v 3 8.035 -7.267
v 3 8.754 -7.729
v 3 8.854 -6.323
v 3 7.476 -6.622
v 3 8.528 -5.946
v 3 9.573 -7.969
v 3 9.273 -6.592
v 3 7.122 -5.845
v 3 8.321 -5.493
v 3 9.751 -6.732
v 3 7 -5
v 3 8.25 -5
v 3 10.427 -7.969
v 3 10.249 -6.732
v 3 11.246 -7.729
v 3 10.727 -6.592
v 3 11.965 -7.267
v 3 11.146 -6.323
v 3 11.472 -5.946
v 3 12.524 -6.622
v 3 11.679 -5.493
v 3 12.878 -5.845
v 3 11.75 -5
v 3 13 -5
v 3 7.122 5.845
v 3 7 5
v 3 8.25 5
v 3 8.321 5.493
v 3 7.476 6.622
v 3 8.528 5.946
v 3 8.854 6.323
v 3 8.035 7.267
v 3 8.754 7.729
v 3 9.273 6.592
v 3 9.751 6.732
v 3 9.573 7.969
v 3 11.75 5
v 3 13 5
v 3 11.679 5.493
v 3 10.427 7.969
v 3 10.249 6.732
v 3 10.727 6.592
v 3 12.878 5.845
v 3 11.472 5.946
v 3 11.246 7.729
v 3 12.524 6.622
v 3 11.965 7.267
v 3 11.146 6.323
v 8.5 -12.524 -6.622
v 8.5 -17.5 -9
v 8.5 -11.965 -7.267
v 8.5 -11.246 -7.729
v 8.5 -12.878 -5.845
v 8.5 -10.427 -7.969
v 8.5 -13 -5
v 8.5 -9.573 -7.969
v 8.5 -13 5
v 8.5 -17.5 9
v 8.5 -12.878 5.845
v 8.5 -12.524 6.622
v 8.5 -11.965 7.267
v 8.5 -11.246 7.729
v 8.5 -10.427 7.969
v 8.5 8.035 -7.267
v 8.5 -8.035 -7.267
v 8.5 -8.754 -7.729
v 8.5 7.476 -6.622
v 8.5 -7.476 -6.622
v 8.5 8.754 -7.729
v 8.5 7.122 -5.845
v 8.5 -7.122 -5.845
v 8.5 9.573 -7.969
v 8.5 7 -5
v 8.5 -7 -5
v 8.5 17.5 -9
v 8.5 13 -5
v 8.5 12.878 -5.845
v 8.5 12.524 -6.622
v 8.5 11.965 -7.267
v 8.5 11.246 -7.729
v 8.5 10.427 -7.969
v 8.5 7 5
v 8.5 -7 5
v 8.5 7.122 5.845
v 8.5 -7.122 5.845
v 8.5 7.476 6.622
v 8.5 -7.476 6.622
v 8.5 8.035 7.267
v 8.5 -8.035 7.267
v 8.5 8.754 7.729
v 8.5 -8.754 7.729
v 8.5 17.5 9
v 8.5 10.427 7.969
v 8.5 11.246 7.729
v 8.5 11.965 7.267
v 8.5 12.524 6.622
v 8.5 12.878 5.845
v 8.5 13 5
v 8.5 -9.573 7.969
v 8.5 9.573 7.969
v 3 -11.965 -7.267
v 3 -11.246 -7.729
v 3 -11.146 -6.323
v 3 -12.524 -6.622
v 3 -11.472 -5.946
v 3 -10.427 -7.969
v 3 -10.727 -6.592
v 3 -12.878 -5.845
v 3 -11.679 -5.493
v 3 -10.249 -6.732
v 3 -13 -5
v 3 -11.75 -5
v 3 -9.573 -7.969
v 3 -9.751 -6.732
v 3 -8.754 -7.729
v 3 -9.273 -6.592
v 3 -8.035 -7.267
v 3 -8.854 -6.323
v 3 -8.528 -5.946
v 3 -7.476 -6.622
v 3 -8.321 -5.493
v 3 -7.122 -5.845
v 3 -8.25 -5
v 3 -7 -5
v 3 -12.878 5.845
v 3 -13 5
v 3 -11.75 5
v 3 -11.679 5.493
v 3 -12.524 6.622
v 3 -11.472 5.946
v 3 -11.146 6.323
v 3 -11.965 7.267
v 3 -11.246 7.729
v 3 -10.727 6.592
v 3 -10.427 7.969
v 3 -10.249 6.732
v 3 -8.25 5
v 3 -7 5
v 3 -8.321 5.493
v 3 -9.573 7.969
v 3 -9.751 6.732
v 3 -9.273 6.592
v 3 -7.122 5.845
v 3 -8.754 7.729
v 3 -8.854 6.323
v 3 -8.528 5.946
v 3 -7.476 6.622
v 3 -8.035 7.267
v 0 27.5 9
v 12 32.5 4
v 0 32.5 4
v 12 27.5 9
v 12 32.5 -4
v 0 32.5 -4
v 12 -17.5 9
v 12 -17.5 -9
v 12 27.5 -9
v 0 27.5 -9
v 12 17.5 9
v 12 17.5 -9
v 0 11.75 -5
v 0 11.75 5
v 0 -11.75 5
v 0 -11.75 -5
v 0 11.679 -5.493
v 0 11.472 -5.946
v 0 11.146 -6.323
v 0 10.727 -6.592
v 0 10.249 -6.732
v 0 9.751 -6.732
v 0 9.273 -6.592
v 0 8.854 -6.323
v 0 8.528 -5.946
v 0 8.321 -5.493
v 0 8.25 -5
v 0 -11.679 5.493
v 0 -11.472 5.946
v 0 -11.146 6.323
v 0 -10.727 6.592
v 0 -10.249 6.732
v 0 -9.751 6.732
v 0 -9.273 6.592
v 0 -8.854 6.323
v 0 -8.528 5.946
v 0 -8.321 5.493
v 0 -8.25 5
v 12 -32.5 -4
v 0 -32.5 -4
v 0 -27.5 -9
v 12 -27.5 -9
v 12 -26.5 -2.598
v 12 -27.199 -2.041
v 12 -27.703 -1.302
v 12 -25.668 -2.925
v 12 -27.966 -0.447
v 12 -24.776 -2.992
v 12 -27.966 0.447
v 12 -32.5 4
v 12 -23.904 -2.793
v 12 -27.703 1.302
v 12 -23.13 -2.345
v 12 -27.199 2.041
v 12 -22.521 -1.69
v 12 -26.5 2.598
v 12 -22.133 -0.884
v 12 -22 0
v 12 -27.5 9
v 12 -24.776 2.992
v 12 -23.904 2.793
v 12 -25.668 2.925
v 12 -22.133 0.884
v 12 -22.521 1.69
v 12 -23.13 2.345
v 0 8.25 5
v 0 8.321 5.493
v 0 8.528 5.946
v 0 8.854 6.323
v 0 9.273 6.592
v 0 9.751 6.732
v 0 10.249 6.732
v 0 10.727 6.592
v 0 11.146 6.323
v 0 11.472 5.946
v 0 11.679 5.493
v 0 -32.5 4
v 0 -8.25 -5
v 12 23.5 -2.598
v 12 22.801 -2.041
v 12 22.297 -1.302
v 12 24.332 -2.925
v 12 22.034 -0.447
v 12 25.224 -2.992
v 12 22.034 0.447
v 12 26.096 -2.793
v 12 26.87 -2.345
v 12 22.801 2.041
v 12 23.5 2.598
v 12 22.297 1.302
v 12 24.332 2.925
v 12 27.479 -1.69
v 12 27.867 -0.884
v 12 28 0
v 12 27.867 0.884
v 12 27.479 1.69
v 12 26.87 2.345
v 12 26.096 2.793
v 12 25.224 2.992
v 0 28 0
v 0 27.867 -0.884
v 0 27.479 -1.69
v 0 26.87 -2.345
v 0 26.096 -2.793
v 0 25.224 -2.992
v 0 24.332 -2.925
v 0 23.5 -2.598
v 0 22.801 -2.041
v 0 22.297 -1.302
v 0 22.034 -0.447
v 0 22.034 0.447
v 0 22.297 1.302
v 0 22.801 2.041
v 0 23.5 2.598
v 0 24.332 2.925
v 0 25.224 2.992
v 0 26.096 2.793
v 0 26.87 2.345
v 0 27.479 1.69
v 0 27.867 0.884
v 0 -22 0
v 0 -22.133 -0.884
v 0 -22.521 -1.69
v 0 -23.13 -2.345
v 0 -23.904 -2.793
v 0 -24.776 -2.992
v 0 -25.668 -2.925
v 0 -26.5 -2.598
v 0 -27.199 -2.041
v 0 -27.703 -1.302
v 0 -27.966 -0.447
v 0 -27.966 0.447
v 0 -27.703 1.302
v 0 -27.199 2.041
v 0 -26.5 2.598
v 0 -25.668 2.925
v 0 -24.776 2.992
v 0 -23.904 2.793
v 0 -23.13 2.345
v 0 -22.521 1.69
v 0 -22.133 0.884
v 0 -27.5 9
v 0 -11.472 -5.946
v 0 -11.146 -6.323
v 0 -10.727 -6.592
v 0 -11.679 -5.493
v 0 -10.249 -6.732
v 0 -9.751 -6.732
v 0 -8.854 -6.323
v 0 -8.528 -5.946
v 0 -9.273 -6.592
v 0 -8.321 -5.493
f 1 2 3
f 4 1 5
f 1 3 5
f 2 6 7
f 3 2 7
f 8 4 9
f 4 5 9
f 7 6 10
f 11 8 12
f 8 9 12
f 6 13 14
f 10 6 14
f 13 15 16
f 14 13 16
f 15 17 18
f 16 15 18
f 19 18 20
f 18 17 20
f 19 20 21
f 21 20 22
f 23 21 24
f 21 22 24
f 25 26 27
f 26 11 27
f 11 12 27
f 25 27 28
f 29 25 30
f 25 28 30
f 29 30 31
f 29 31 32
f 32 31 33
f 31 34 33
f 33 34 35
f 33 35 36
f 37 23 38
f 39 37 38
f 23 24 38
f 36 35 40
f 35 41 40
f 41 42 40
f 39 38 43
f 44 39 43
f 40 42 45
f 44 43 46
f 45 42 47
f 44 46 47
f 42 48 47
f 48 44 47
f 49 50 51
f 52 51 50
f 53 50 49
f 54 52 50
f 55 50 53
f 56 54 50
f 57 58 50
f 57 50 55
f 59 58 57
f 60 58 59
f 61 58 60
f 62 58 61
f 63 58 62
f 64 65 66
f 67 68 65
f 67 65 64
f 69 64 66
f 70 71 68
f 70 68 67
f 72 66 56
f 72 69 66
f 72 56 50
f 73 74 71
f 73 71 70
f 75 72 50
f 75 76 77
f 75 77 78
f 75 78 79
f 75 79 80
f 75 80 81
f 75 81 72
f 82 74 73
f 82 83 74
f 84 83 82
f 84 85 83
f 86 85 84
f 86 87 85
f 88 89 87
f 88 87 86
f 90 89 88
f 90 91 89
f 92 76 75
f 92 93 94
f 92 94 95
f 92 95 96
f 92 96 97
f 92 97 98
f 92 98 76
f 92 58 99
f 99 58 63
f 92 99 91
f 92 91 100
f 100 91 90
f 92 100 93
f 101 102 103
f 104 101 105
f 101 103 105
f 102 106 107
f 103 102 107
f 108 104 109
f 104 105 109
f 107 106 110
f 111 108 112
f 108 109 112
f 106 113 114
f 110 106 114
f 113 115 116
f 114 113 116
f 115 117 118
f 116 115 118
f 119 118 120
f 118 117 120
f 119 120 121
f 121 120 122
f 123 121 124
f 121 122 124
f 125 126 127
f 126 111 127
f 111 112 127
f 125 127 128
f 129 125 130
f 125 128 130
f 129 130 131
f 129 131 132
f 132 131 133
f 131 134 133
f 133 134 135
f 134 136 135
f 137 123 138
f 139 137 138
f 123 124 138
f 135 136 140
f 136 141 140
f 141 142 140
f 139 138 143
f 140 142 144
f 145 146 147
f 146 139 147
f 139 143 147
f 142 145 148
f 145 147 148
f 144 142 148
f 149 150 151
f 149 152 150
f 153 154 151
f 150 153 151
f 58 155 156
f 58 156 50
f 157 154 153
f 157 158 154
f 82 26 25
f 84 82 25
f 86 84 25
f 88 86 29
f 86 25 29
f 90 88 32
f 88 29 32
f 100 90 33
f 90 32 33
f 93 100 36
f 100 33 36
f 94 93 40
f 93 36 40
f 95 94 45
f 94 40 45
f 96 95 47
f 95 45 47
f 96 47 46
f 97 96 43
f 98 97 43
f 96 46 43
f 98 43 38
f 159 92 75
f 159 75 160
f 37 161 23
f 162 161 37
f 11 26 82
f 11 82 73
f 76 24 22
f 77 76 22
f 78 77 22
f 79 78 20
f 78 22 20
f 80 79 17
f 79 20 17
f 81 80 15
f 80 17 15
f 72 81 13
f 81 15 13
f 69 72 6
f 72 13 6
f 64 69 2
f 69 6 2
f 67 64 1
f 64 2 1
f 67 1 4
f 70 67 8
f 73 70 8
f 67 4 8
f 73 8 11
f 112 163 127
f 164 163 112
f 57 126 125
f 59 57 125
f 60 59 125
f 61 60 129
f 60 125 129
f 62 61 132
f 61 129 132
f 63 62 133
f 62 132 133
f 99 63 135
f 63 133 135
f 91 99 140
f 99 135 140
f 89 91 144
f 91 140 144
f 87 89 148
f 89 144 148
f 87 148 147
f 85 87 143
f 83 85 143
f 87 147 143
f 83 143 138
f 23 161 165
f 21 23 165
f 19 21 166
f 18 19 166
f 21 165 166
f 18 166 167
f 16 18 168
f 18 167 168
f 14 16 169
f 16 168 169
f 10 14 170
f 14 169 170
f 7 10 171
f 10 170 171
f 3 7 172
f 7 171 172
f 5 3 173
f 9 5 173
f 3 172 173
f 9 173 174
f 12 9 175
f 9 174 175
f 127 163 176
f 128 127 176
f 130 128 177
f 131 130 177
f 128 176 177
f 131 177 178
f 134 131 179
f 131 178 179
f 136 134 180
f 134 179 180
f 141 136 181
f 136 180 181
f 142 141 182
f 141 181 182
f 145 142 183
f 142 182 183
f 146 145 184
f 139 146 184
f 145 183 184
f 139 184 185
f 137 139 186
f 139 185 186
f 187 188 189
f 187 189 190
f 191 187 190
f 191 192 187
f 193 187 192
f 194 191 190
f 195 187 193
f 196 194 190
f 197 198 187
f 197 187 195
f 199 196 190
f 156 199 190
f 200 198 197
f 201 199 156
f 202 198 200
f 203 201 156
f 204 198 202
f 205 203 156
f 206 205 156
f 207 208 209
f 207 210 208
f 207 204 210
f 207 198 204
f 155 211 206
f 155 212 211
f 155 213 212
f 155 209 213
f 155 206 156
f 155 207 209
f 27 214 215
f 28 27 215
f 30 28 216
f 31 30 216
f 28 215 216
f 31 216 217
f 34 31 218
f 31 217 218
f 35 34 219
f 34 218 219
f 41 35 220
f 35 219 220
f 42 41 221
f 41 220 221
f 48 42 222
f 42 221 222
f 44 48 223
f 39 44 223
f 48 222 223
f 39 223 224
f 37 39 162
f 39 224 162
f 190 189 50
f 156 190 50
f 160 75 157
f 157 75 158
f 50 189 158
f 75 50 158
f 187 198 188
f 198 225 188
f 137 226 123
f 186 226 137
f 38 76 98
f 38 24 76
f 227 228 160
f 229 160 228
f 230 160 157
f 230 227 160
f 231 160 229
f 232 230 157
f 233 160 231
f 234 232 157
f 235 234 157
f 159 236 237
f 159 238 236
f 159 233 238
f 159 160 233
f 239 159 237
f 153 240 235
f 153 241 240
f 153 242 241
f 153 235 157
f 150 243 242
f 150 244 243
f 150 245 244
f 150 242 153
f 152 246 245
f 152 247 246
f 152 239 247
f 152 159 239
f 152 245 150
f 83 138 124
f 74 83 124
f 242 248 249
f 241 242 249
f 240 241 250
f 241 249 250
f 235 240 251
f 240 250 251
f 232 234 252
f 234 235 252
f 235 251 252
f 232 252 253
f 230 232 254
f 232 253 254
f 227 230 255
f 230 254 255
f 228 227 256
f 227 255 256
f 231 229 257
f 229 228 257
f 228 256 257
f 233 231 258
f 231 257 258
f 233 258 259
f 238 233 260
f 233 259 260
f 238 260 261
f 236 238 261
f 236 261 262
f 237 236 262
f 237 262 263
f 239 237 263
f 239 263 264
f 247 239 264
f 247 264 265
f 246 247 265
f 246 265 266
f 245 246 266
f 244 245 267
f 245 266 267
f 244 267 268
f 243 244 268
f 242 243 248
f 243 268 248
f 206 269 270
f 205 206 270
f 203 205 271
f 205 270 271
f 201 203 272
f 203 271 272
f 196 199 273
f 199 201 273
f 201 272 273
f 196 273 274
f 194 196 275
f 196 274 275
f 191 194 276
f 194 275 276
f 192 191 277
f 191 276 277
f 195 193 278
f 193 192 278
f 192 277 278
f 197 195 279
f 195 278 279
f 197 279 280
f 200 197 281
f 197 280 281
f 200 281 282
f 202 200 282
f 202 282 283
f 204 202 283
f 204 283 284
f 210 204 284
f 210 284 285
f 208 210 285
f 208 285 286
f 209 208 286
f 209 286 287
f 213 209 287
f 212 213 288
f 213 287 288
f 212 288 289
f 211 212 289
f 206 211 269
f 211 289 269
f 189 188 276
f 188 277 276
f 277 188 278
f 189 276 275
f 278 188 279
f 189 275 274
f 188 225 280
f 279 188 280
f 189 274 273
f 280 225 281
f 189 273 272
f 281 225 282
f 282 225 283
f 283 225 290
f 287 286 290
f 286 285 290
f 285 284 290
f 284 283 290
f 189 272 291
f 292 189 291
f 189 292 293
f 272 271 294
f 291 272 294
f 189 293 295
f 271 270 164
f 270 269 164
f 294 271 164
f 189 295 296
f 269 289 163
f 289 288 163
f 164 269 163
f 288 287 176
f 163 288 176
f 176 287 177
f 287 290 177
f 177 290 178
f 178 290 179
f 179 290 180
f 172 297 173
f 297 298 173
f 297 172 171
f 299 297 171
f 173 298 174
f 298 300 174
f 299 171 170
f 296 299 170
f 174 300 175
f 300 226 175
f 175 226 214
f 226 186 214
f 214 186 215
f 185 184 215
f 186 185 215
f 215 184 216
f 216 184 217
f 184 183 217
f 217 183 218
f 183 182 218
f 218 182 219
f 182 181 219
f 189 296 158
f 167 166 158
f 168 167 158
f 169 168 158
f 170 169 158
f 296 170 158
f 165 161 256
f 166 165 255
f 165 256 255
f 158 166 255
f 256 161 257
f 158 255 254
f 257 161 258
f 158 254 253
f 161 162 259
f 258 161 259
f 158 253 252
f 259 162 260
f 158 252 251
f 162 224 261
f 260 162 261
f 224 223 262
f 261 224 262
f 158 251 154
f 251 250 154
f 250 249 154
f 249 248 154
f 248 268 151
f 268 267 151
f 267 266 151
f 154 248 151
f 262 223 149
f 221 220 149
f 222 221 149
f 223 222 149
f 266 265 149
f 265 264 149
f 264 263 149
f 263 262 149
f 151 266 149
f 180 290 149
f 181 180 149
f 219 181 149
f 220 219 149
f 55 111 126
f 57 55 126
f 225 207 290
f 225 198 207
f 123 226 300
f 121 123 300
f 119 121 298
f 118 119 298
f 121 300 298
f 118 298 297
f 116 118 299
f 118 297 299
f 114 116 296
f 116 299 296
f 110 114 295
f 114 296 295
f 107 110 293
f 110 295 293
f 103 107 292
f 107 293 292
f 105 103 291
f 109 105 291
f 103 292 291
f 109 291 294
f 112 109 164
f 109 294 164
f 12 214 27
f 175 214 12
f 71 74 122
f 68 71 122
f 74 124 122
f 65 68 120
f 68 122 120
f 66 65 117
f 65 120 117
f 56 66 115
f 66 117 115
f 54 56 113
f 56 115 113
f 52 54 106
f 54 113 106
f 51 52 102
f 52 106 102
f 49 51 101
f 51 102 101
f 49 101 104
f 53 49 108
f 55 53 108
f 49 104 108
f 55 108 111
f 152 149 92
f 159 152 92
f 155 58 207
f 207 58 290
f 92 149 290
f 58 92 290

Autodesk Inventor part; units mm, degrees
ref_plane "YZ Plane" through (0, 0, 0) normal (1, 0, 0) x (0, 1, 0)
ref_plane "XZ Plane" through (0, 0, 0) normal (0, 1, 0) x (-1, 0, 0)
ref_plane "XY Plane" through (0, 0, 0) normal (0, 0, 1) x (1, 0, 0)
sketch "Sketch1" plane through (0, 0, 0) normal (1, 0, 0) x (0, 1, 0)
  line L0 (32.5, 9) -> (-32.5, 9)
  line L1 (-32.5, 9) -> (-32.5, -9)
  line L2 (-32.5, -9) -> (32.5, -9)
  line L3 (32.5, -9) -> (32.5, 9)
  line L4 (32.5, 9) -> (-32.5, -9) construction
  line L5 (-32.5, 9) -> (32.5, -9) construction
  circle A0 centre (-25, 0) radius 3
  circle A1 centre (25, 0) radius 3
  line L6 (-10, -5) -> (-10, 5) construction
  line L7 (-13, -5) -> (-13, 5)
  line L8 (-7, 5) -> (-7, -5)
  arc A2 (-13, -5) -> (-7, -5) centre (-10, -5) ccw
  arc A3 (-7, 5) -> (-13, 5) centre (-10, 5) ccw
  line L9 (10, -5) -> (10, 5) construction
  line L10 (13, -5) -> (13, 5)
  line L11 (7, 5) -> (7, -5)
  arc A4 (7, -5) -> (13, -5) centre (10, -5) ccw
  arc A5 (13, 5) -> (7, 5) centre (10, 5) ccw
  point P0 (0, 0)
  point P1 (-10, 0)
  point P2 (10, 0)
  dimension "d0" = 25
  dimension "d1" = 50
  dimension "d2" = 65
  dimension "d3" = 6
  dimension "d4" = 10
  dimension "d5" = 20
  dimension "d6" = 10
  dimension "d7" = 3
  dimension "d8" = 18
extrude "Extrusion1" add sketch "Sketch1" along normal blind 12
sketch "Sketch2" plane through (0, 0, 0) normal (-1, 0, 0) x (0, 0, 1)
  line L0 (9, -32.5) -> (-9, -32.5) projected
  line L1 (9, 32.5) -> (9, -32.5) projected
  line L2 (-9, 32.5) -> (9, 32.5) projected
  line L3 (-9, -32.5) -> (-9, 32.5) projected
  circle A0 centre (0, -25) radius 3 projected
  circle A1 centre (0, 25) radius 3 projected
  arc A2 (-5, 13) -> (-5, 7) centre (-5, 10) ccw projected
  line L4 (5, 13) -> (-5, 13) projected
  arc A3 (5, 7) -> (5, 13) centre (5, 10) ccw projected
  line L5 (-5, 7) -> (5, 7) projected
  line L6 (5, -7) -> (-5, -7) projected
  arc A4 (5, -13) -> (5, -7) centre (5, -10) ccw projected
  line L7 (-5, -13) -> (5, -13) projected
  arc A5 (-5, -7) -> (-5, -13) centre (-5, -10) ccw projected
  line L8 (5, 10) -> (-5, 10) construction
  line L9 (5, 8.25) -> (-5, 8.25)
  line L10 (-5, 11.75) -> (5, 11.75)
  arc A6 (5, 8.25) -> (5, 11.75) centre (5, 10) ccw
  arc A7 (-5, 11.75) -> (-5, 8.25) centre (-5, 10) ccw
  line L11 (5, -10) -> (-5, -10) construction
  line L12 (5, -11.75) -> (-5, -11.75)
  line L13 (-5, -8.25) -> (5, -8.25)
  arc A8 (5, -11.75) -> (5, -8.25) centre (5, -10) ccw
  arc A9 (-5, -8.25) -> (-5, -11.75) centre (-5, -10) ccw
  point P0 (0, 0)
  point P1 (0, 10)
  point P2 (0, -10)
  dimension "d11" = 3.5
extrude "Extrusion2" add sketch "Sketch2" against normal blind 3 contours L4 A3 L5 A2 | A4 L7 A5 L6
chamfer "Chamfer1" distance 5 angle 45 4 edges at (6, -32.5, 9) (6, -32.5, -9) (6, 32.5, -9) (6, 32.5, 9)
sketch "Sketch3" plane through (0, -27.5, 9) normal (0, 0, 1) x (1, 0, 0)
  line L0 (0, 55) -> (12, 55) projected
  line L1 (0, 55) -> (0, 0) projected
  line L2 (12, 0) -> (0, 0) projected
  line L3 (12, 55) -> (12, 0) projected
  line L4 (12, 10) -> (8.5, 10)
  line L5 (8.5, 10) -> (8.5, 45)
  line L6 (8.5, 45) -> (12, 45)
  line L7 (12, 45) -> (12, 10)
  line L8 (12, 10) -> (8.5, 45) construction
  line L9 (8.5, 10) -> (12, 45) construction
  point P0 (0, 27.5)
  point P1 (10.25, 27.5)
  point P2 (0, 27.5)
  point P3 (12, 10)
  dimension "d17" = 35
  dimension "d18" = 3.5
extrude "Extrusion3" cut sketch "Sketch3" against normal through all contours L3 L4 L5 L6
equation "\"d1\" = 2 * d0"
equation "\"d5\" = 2 * d4"
properties part number "ToolDock_Center" material "ABS Plastic"
